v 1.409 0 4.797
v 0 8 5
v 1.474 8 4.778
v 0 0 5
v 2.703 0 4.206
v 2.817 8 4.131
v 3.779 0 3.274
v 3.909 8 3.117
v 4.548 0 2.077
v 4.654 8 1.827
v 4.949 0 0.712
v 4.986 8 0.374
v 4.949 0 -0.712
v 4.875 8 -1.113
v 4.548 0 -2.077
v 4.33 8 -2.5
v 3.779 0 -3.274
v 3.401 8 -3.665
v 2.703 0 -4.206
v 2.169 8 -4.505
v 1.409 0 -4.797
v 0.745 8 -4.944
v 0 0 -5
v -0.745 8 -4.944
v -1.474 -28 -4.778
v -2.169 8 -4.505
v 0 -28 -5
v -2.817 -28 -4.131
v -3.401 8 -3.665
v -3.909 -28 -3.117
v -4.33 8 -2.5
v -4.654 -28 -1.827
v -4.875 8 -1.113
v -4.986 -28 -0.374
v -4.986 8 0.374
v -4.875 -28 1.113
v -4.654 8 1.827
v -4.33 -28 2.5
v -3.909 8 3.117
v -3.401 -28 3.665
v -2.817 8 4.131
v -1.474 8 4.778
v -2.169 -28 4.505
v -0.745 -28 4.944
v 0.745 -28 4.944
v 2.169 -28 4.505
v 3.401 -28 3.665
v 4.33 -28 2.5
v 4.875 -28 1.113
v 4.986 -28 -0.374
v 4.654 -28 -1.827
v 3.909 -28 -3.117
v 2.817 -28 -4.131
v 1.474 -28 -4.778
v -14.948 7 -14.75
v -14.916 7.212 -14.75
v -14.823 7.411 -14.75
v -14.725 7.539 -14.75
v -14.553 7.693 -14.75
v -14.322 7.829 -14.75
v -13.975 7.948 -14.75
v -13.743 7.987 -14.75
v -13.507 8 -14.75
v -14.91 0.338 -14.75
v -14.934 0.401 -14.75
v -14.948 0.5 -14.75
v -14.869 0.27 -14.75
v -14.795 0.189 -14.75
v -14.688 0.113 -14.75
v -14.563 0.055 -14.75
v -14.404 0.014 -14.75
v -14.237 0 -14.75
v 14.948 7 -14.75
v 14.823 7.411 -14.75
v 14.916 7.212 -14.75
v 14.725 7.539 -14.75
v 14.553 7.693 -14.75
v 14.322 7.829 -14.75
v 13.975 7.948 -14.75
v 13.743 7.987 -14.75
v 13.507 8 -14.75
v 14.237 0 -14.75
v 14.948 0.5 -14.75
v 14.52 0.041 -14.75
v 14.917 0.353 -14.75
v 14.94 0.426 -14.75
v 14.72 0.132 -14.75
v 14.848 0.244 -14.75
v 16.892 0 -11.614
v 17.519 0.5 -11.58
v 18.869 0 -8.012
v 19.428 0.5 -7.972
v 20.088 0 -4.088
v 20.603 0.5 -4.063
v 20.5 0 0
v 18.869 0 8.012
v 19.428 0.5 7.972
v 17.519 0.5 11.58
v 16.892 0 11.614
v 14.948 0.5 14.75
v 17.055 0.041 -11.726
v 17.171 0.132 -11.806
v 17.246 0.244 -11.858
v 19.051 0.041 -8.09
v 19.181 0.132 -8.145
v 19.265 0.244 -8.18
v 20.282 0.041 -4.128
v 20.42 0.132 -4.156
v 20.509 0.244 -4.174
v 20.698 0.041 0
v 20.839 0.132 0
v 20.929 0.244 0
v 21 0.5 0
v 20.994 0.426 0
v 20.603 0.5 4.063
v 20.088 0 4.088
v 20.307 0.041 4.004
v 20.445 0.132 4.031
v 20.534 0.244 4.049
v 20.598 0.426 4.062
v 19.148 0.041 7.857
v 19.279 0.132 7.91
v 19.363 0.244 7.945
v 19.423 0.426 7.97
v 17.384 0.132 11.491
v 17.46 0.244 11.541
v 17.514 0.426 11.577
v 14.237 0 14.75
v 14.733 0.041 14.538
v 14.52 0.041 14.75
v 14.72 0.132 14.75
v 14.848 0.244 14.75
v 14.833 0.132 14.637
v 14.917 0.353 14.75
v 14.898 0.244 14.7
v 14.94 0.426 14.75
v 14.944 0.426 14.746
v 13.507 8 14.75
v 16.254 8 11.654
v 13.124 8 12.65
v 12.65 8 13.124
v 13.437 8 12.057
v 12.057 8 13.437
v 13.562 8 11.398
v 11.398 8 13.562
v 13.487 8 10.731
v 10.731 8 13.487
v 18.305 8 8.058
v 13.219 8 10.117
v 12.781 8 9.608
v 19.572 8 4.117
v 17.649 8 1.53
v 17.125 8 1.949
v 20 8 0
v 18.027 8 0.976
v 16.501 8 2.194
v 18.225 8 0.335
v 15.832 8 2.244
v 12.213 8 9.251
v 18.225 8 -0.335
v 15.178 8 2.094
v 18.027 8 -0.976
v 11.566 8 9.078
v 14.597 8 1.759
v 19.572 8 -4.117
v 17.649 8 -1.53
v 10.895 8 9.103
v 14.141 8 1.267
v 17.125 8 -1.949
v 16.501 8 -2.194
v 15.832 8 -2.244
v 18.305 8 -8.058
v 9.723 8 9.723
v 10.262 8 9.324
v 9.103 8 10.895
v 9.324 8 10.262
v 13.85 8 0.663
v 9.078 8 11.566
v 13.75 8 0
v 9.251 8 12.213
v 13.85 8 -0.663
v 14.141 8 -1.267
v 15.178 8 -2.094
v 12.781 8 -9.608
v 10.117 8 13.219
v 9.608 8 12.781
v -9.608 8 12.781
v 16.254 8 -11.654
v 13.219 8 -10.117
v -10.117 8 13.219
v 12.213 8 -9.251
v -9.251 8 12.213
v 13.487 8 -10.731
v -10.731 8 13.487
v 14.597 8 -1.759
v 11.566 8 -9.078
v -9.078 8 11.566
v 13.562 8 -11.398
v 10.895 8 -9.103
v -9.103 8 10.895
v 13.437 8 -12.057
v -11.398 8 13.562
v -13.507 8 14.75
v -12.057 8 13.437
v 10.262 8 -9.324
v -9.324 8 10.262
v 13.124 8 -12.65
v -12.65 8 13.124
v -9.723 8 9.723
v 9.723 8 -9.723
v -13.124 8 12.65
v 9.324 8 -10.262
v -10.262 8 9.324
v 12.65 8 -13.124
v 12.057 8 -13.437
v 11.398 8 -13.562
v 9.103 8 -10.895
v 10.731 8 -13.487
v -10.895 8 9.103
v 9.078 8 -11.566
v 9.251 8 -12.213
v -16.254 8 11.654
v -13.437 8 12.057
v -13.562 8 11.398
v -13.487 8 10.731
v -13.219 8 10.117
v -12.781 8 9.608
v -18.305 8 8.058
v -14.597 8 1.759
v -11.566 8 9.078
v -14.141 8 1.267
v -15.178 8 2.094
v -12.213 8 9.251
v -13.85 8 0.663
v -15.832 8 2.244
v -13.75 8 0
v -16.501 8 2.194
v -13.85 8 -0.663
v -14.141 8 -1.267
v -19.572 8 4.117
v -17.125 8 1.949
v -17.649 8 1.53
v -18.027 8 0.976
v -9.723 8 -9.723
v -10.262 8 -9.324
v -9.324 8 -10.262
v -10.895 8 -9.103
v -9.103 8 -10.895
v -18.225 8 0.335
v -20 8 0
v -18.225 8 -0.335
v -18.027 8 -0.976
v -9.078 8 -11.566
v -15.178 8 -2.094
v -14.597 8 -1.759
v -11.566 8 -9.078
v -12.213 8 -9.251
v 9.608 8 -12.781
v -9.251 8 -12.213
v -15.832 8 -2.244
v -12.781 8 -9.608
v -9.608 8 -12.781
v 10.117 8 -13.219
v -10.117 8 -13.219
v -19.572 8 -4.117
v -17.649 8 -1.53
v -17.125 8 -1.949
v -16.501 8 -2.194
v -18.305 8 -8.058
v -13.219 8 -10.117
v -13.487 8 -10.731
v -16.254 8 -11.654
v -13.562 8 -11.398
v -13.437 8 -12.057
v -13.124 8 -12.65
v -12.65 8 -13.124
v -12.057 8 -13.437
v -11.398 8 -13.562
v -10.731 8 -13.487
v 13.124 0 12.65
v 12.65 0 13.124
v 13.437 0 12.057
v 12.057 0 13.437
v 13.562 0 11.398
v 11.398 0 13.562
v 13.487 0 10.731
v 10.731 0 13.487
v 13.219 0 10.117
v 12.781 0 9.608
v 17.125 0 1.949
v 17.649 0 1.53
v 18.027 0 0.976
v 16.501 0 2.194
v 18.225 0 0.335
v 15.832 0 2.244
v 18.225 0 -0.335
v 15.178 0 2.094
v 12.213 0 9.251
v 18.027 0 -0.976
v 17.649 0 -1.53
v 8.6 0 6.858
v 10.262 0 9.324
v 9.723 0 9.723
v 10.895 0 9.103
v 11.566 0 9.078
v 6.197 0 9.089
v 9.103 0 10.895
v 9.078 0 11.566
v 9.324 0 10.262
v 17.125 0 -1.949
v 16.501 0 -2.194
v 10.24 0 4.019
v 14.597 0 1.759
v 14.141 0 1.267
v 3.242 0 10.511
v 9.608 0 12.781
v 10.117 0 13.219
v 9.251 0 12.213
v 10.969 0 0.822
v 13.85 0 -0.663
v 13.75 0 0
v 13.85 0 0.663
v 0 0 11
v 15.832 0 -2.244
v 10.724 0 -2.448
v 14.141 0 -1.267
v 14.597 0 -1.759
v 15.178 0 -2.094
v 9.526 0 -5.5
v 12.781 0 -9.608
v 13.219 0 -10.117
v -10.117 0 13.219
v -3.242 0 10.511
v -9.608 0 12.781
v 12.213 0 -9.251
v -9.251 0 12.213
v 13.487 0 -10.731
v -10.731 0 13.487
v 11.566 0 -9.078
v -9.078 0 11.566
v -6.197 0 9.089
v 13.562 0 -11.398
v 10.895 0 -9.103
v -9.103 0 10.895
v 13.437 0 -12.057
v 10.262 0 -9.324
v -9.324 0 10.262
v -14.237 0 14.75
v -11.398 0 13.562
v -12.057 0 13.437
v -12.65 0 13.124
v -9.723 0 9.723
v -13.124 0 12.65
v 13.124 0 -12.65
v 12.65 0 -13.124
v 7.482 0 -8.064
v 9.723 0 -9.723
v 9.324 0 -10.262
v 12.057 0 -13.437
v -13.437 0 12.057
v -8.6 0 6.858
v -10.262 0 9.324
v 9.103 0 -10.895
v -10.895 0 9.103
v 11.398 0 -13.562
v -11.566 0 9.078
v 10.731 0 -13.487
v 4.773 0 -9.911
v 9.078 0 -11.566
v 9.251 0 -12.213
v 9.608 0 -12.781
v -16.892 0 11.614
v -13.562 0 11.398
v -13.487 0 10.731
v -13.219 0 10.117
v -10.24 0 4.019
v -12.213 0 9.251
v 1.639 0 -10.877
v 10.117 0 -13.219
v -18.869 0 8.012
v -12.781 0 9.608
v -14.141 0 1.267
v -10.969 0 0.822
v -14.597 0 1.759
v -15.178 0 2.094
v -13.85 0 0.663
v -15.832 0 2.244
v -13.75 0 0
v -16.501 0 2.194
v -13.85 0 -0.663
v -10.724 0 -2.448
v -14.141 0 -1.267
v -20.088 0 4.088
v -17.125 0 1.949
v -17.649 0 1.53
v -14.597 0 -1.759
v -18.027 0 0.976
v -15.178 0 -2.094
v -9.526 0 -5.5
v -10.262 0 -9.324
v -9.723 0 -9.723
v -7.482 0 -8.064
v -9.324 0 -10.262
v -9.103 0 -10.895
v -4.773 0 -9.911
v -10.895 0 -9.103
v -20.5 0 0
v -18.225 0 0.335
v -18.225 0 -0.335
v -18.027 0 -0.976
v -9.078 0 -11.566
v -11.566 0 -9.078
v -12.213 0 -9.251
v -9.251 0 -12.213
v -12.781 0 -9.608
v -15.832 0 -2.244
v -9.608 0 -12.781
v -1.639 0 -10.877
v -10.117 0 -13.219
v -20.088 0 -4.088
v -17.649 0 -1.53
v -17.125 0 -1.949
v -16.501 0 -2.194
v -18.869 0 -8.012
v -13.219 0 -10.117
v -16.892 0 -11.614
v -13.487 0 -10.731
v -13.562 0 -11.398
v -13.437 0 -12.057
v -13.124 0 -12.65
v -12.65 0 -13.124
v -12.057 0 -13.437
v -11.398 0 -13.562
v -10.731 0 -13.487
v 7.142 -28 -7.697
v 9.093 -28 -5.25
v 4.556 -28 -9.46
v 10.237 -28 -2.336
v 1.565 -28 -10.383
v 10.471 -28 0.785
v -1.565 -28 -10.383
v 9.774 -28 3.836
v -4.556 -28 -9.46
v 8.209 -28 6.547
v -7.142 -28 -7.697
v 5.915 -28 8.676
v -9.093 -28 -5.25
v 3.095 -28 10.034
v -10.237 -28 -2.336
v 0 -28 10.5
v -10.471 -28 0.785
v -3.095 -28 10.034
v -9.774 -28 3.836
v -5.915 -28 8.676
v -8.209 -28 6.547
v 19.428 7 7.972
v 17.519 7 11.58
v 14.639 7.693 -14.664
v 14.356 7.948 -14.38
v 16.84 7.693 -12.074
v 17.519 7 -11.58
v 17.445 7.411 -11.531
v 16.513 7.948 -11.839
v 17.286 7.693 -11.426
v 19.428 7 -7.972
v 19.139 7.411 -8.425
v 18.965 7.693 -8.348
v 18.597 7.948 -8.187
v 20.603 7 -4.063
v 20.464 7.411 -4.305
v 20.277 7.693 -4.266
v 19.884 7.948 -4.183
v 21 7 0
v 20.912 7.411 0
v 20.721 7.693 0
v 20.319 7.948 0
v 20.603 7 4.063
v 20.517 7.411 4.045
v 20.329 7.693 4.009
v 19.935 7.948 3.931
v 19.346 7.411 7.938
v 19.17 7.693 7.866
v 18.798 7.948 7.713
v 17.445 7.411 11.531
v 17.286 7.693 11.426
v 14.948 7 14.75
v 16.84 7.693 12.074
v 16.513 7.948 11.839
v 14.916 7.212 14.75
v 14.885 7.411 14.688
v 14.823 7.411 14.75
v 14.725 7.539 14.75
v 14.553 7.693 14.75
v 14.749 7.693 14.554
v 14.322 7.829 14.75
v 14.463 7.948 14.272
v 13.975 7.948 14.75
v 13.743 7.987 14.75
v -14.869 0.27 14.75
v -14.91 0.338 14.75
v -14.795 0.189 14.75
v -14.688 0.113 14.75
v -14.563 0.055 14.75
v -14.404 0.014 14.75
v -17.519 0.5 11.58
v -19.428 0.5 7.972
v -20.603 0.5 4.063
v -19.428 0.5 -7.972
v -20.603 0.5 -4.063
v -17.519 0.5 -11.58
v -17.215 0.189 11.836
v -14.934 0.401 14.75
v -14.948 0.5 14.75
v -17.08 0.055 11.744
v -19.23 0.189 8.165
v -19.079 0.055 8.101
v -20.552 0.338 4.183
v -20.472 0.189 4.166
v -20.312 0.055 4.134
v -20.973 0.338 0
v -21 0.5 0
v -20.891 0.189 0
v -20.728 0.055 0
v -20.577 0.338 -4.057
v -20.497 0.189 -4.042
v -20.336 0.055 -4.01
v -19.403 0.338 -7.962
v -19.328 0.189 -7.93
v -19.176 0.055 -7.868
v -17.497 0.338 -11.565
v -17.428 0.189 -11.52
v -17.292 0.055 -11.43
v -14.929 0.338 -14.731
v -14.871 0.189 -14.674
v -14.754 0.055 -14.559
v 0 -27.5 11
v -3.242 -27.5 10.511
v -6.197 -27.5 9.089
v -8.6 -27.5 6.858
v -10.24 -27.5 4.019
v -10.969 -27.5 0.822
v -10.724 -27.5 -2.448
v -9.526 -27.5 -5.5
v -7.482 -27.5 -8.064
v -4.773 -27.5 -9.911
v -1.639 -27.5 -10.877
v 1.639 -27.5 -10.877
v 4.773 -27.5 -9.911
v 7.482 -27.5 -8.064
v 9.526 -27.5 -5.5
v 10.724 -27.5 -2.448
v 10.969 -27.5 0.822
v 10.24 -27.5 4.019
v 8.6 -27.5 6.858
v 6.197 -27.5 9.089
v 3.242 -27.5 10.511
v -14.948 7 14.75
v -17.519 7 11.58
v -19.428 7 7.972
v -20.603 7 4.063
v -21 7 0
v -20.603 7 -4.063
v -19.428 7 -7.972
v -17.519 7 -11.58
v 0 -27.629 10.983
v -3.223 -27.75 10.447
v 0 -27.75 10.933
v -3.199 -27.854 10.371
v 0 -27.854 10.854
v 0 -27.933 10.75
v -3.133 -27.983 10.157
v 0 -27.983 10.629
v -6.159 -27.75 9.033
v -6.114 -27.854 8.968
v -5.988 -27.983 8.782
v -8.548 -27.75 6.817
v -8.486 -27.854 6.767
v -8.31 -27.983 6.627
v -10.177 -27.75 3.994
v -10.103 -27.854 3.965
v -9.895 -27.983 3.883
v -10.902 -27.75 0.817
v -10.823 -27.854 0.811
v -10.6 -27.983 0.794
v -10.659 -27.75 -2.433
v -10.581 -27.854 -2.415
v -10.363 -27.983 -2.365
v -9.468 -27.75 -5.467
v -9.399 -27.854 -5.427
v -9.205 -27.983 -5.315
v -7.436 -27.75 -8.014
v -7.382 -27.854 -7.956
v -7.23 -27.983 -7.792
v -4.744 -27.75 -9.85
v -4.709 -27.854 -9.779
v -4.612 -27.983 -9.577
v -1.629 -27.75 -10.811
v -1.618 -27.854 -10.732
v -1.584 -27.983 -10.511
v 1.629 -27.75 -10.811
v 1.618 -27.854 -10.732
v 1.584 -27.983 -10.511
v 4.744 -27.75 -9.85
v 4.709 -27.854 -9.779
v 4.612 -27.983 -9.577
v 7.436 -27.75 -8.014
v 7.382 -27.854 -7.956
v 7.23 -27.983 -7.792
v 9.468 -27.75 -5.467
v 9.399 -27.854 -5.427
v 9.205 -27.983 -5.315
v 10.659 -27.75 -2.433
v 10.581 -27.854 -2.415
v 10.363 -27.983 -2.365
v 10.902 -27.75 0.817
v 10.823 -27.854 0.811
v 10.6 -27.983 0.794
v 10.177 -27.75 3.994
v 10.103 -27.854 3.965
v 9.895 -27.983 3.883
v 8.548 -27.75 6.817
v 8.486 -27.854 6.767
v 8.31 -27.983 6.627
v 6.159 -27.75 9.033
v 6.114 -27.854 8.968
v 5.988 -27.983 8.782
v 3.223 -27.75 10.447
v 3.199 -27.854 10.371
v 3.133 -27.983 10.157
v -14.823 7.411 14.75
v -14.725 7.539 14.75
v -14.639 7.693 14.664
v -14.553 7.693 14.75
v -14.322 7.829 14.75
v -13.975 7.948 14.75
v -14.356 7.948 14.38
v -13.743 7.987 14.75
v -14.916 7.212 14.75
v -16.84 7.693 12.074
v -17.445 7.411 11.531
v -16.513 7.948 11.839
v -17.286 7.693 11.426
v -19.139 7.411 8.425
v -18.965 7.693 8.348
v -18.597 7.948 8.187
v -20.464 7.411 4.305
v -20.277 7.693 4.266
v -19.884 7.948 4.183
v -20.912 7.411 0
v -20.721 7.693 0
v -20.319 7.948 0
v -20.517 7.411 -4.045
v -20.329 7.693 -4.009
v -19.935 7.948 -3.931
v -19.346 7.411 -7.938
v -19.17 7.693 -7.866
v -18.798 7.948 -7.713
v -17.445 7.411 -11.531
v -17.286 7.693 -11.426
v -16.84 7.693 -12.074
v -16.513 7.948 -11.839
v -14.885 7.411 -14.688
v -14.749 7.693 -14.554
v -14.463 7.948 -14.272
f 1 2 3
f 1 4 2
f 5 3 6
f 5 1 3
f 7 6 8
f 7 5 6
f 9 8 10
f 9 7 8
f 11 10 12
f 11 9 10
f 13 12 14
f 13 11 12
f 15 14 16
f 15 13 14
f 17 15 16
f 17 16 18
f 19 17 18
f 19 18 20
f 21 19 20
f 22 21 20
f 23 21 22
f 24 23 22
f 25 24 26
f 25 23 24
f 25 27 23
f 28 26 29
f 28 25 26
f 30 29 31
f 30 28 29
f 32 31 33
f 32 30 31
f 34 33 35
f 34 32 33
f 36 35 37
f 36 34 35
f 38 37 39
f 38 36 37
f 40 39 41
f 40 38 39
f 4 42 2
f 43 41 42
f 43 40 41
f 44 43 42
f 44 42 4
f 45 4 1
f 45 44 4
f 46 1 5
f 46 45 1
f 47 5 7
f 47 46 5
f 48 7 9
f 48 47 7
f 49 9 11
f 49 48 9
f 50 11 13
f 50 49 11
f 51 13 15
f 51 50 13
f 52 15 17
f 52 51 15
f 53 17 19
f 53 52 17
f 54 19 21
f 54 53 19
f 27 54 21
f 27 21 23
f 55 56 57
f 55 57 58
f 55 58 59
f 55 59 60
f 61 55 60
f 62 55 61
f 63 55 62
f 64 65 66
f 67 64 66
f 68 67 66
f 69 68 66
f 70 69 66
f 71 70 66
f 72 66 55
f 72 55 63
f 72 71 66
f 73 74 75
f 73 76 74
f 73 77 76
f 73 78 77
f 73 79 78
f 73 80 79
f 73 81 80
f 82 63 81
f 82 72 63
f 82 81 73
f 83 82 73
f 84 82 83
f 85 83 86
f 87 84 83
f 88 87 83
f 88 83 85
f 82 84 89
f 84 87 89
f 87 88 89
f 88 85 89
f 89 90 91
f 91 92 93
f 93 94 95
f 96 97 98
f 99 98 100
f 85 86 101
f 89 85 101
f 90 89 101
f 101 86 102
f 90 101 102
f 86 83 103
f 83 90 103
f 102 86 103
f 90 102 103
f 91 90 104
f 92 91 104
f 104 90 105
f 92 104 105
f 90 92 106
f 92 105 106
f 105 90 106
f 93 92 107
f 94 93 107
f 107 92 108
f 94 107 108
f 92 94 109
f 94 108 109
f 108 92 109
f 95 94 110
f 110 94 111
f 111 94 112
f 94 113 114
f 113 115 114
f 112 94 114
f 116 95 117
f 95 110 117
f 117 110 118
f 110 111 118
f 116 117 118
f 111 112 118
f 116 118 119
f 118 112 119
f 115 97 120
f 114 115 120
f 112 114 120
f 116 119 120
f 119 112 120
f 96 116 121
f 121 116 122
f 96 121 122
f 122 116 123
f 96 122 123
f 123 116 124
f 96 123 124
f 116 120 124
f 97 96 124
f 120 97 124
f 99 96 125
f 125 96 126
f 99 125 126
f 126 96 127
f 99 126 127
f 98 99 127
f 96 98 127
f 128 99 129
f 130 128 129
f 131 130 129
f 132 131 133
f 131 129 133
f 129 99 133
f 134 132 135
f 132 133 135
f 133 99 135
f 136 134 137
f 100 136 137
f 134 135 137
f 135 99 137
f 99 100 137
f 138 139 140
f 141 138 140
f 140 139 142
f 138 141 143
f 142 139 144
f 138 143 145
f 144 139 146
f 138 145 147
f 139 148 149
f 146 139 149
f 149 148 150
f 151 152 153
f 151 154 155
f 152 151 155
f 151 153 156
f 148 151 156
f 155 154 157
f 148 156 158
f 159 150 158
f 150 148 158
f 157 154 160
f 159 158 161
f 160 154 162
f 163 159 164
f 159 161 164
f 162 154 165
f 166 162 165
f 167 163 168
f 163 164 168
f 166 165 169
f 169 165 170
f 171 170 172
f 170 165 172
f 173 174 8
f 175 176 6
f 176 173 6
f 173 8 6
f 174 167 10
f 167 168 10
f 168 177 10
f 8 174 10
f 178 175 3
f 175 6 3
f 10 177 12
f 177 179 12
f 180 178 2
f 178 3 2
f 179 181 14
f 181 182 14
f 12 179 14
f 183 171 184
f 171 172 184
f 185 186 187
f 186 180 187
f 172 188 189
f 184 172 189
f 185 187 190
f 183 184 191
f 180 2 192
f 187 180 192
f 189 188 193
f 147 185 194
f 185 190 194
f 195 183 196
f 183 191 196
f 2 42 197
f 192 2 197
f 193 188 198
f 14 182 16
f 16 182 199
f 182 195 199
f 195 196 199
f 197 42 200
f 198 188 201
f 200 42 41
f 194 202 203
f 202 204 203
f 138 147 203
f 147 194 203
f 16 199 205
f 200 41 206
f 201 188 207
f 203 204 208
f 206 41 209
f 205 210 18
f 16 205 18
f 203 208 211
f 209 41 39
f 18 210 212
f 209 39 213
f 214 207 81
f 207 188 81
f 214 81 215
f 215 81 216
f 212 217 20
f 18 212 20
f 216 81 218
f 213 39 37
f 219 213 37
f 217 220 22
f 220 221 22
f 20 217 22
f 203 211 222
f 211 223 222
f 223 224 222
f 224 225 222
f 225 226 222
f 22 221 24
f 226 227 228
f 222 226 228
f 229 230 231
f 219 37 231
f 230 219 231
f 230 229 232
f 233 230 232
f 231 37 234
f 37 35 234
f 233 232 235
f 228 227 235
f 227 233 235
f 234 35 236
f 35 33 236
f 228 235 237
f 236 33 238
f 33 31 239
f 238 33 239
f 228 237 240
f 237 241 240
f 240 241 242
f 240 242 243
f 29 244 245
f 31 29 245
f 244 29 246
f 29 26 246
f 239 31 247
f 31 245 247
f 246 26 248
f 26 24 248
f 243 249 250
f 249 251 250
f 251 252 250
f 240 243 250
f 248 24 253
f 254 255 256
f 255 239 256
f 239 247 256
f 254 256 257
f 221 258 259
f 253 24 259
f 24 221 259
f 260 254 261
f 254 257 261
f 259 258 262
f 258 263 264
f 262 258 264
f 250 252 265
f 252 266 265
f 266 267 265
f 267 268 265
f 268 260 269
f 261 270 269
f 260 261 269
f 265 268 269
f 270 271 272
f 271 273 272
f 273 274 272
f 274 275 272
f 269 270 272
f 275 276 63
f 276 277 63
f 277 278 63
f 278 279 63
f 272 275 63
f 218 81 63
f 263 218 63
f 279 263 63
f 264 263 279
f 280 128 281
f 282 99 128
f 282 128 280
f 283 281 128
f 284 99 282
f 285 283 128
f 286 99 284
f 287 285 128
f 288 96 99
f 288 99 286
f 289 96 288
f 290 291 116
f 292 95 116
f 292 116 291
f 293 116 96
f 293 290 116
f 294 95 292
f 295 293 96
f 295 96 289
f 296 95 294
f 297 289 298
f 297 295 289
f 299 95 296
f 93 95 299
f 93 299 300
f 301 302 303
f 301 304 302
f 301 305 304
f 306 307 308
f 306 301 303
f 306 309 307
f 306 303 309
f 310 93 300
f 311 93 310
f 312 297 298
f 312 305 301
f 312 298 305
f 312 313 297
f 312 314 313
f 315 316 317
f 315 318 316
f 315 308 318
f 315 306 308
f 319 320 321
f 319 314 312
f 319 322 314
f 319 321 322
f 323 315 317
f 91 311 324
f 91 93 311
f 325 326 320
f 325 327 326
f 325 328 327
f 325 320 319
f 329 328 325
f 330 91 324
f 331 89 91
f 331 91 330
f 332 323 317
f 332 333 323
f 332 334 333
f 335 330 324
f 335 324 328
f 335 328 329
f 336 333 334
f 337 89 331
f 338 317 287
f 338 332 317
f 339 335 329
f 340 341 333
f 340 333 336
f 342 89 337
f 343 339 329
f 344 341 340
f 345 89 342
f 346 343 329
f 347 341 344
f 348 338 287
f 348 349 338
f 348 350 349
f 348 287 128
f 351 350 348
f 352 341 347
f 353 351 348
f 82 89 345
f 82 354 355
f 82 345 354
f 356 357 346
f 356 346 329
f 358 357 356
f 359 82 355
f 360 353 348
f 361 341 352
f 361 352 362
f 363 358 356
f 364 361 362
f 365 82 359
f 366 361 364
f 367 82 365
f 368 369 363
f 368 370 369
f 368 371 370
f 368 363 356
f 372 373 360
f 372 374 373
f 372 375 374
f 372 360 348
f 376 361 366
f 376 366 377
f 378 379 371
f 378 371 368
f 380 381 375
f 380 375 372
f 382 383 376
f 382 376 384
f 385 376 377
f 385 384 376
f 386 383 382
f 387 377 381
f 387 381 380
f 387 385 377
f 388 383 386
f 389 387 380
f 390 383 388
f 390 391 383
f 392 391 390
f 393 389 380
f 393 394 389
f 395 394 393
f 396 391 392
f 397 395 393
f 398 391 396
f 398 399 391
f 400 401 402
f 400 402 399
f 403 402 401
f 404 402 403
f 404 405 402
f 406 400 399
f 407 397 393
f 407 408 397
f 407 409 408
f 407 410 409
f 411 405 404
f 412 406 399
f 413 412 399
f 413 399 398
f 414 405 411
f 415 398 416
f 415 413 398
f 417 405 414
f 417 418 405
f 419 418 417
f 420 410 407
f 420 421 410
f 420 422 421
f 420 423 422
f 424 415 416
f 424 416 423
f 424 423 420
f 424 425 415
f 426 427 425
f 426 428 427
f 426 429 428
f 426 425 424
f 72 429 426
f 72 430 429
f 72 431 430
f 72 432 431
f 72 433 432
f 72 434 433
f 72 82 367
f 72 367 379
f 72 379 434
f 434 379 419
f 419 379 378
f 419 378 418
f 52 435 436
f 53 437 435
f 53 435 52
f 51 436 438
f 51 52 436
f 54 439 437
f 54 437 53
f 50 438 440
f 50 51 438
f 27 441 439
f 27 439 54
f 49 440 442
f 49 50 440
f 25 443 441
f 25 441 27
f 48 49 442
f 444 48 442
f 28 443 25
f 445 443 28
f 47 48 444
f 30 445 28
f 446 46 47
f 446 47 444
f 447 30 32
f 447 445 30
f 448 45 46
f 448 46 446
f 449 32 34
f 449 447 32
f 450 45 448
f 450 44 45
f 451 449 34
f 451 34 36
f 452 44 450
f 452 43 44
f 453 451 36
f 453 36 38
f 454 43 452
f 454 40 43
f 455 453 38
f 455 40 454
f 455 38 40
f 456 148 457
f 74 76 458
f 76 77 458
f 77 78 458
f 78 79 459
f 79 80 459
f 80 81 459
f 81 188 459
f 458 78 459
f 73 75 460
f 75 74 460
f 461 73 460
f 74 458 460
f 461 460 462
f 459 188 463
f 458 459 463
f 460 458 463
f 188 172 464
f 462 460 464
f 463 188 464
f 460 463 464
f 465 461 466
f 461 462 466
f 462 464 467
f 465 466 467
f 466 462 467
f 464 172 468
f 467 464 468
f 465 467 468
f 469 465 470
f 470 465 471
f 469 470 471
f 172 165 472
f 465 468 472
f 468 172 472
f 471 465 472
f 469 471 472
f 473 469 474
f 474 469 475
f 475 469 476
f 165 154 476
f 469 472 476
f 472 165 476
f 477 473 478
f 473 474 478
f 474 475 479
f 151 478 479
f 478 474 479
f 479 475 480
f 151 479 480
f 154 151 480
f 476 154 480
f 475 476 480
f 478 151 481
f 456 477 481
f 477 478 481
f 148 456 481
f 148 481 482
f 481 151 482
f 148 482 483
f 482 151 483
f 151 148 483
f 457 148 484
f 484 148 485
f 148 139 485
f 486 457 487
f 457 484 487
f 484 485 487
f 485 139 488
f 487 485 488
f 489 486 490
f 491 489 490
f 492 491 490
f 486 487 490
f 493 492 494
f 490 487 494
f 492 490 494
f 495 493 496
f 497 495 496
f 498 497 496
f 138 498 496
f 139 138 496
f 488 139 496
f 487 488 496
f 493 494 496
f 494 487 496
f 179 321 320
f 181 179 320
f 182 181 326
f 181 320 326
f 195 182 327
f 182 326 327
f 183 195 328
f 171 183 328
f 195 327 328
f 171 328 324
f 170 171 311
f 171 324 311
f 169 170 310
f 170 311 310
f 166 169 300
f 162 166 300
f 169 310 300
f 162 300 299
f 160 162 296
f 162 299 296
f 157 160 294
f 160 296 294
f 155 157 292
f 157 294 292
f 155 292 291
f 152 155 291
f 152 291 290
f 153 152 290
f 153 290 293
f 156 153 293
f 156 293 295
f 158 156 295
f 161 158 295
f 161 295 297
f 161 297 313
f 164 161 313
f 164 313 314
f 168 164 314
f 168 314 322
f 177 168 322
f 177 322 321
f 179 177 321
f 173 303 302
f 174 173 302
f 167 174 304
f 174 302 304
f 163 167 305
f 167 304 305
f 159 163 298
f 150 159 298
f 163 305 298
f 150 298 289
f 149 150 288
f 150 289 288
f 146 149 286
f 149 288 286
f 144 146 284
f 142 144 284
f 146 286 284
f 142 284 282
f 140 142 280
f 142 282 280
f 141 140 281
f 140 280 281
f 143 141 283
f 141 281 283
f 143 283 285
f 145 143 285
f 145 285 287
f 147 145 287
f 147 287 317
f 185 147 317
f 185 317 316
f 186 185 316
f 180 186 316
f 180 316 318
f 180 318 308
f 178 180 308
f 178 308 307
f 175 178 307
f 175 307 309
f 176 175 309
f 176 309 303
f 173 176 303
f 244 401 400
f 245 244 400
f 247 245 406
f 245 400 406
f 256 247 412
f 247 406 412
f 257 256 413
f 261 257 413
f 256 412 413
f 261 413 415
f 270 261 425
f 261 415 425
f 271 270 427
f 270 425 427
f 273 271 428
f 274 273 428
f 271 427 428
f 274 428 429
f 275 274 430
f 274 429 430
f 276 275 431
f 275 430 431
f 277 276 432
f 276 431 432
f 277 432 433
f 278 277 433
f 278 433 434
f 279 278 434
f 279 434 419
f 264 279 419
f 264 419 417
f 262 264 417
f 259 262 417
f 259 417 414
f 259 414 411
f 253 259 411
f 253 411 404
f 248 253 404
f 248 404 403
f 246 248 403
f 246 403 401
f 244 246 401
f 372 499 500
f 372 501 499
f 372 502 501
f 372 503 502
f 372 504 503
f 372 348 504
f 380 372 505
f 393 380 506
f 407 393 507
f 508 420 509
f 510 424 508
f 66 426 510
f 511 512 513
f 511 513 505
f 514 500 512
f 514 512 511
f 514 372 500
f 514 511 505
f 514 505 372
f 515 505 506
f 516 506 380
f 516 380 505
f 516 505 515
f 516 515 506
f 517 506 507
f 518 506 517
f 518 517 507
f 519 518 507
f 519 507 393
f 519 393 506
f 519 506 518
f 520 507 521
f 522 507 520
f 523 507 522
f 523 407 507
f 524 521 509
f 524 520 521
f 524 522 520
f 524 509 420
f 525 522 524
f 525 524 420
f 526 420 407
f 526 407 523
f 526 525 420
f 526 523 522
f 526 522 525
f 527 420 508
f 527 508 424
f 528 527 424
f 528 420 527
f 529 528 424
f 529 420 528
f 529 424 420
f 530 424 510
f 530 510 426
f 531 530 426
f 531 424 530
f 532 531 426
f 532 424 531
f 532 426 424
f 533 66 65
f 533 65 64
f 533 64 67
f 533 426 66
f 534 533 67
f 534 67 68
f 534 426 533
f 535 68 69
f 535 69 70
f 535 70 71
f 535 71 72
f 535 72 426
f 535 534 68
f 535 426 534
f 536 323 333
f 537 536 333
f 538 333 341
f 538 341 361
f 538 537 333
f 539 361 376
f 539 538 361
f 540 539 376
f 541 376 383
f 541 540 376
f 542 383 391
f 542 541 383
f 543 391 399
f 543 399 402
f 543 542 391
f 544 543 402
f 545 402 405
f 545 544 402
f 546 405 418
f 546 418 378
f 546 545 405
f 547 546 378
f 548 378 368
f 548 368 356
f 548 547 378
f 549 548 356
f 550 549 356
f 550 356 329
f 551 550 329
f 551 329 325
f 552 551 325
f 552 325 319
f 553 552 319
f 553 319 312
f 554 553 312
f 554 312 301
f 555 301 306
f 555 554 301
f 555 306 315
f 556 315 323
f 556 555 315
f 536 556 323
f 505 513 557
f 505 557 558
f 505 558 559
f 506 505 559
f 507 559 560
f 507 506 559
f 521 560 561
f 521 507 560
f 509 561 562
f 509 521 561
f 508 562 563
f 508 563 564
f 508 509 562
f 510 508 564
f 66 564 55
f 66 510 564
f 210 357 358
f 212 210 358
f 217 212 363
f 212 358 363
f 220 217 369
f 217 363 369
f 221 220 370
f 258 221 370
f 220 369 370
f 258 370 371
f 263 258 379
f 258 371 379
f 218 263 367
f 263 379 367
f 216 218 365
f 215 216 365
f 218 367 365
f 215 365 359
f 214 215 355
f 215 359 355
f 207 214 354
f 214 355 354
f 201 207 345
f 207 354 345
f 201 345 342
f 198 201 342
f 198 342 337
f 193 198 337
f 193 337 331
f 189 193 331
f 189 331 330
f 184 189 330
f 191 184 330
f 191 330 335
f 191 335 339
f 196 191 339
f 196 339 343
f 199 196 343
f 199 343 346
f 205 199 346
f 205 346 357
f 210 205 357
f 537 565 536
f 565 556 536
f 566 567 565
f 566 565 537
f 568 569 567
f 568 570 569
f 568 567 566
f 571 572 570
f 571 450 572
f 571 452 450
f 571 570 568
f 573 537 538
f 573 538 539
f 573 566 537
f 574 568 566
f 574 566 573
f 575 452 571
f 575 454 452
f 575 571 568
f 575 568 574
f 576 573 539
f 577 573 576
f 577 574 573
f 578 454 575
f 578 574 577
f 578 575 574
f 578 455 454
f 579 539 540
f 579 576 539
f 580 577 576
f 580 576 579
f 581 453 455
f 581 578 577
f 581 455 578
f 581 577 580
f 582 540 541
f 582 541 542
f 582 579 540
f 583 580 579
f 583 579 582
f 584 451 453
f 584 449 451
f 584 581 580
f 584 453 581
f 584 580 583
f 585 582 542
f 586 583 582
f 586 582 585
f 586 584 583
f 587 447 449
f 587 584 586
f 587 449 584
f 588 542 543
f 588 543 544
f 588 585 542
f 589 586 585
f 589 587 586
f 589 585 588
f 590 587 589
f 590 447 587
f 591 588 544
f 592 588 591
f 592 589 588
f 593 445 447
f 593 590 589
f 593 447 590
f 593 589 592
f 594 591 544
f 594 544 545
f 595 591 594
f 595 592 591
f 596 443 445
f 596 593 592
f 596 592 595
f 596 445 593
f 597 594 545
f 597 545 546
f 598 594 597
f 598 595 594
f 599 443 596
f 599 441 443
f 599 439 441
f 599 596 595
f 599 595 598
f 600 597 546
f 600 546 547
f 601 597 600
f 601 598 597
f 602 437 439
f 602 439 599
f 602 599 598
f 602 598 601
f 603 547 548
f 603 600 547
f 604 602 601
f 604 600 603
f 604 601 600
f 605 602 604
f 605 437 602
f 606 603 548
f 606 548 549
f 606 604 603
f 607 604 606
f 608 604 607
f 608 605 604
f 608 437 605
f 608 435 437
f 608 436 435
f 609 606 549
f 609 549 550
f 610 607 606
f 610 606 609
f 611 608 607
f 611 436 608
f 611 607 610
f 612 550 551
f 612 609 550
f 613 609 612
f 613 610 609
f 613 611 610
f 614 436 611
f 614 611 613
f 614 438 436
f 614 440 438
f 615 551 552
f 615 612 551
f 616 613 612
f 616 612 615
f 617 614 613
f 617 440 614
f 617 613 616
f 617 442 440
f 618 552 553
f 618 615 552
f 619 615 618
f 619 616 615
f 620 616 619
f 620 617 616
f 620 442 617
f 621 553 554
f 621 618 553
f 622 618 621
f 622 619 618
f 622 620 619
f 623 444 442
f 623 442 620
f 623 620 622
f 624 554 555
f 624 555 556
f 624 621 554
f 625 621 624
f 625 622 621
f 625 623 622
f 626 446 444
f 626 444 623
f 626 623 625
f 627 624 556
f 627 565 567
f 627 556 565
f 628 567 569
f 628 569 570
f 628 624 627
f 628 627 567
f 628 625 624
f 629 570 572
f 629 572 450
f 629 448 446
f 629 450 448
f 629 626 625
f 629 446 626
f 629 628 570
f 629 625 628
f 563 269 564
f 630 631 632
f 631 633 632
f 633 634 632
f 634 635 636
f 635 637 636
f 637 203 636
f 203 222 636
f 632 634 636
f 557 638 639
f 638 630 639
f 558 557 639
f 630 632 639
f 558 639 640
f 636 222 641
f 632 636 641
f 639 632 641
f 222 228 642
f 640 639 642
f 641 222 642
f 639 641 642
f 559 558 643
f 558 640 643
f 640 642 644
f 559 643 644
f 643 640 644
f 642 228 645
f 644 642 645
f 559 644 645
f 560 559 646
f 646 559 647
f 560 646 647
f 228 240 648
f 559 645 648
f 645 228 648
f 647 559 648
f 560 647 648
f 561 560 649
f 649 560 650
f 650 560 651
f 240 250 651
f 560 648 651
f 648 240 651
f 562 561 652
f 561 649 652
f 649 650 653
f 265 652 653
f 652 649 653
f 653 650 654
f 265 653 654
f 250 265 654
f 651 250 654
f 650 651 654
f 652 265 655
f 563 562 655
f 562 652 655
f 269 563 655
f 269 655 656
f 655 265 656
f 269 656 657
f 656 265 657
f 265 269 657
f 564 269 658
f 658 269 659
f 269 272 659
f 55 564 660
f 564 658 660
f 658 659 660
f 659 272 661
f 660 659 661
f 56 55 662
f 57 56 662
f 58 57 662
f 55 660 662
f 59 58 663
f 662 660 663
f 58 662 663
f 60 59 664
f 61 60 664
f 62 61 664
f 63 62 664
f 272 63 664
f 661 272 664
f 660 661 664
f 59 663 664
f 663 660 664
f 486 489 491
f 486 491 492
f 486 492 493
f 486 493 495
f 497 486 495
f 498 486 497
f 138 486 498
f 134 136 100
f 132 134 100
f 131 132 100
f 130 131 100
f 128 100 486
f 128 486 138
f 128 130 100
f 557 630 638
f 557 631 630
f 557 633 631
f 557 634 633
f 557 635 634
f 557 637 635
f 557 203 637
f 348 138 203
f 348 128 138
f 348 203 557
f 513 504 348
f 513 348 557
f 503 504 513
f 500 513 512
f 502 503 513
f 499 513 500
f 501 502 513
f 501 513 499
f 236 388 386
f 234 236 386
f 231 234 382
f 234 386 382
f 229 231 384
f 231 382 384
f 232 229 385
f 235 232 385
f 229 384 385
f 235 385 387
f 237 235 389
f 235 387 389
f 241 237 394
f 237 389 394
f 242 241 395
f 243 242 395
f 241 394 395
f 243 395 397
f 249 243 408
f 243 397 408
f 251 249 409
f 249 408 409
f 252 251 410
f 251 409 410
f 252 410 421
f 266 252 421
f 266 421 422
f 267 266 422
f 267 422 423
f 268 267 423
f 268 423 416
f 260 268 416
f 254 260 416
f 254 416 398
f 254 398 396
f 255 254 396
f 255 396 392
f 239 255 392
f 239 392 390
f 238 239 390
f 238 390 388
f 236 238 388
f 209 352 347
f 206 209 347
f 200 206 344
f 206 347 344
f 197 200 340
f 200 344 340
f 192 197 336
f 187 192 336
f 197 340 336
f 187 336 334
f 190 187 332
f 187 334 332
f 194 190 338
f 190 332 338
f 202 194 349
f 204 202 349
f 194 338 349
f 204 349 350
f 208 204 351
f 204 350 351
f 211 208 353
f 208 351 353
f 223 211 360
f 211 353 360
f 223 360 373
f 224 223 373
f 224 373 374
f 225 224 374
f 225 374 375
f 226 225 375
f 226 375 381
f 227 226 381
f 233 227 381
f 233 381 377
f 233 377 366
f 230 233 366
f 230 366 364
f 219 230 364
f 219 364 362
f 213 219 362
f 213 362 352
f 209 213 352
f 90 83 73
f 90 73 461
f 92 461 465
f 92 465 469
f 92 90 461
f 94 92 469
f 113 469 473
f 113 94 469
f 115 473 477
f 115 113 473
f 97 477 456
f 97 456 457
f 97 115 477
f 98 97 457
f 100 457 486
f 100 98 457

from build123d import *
from build123d.topology import SkipClean

# Parameters (mm, degrees)
SKETCH1_R            = 5
BOSS_EXTRUDE1_DEPTH  = 8
BOSS_EXTRUDE2_START  = 28
SKETCH2_R            = 11
SKETCH2_R_2          = 5
BOSS_EXTRUDE2_DEPTH  = 28
M4_CLEARANCE_HOLE1_D = 4.5
CIRPATTERN1_COUNT    = 8
FILLET1_R            = 1
FILLET2_R            = 0.5


with BuildPart() as part:
    # Sketch1 → Boss-Extrude1 (new body)
    with BuildSketch(Plane(origin=(0, 0, 0), x_dir=(1, 0, 0), z_dir=(0, 1, 0))):
        with BuildLine():
            Line((-14.947825929, 14.75), (14.947825929, 14.75))
            ThreePointArc((14.947825929, 14.75), (21, 0), (14.947825929, -14.75))
            Line((14.947825929, -14.75), (-14.947825929, -14.75))
            ThreePointArc((-14.947825929, -14.75), (-21, 0), (-14.947825929, 14.75))
        make_face()
        with Locations(Location((0, 0, 0), (0, 0, 270))):
            Circle(SKETCH1_R, mode=Mode.SUBTRACT)
    extrude(amount=BOSS_EXTRUDE1_DEPTH)

    # Sketch2 → Boss-Extrude2 (add)
    with SkipClean():  # the faces are left unmerged after this step: merging them gives an invalid solid
        with BuildSketch(Plane.XZ.offset(BOSS_EXTRUDE2_START)):
            with Locations(Location((0, 0, 0), (0, 0, 90))):
                Circle(SKETCH2_R)
            with Locations(Location((0, 0, 0), (0, 0, 270))):
                Circle(SKETCH2_R_2, mode=Mode.SUBTRACT)
        extrude(amount=-BOSS_EXTRUDE2_DEPTH)

    # M4 Clearance Hole1 (through all)
    with Locations(Plane(origin=(0, 8, 0), x_dir=(1, 0, 0), z_dir=(0, 1, 0))):
        with Locations((16, 0)):
            m4_clearance_hole1 = Hole(M4_CLEARANCE_HOLE1_D / 2)

    # CirPattern1: M4 Clearance Hole1 ×8 about axis, 2 skipped
    with SkipClean():  # the faces are left unmerged after this step: merging them gives an invalid solid
        cirpattern1_axis = Axis((0, 0, 0), (0, 1, 0))
        add([m4_clearance_hole1.rotate(cirpattern1_axis, i * 360 / CIRPATTERN1_COUNT) for i in range(1, CIRPATTERN1_COUNT) if i not in (2, 6)], mode=Mode.SUBTRACT)

    # Fillet1
    fillet1_edges = [part.edges().sort_by_distance(p)[0] for p in [
        (21, 8, 0),
        (-21, 8, 0),
    ]]
    fillet(fillet1_edges, radius=FILLET1_R)

    # Fillet2
    fillet2_edges = [part.edges().sort_by_distance(p)[0] for p in [
        (0, -28, -11),
        (21, 0, 0),
        (-21, 0, 0),
    ]]
    fillet(fillet2_edges, radius=FILLET2_R)


solid = part.part
